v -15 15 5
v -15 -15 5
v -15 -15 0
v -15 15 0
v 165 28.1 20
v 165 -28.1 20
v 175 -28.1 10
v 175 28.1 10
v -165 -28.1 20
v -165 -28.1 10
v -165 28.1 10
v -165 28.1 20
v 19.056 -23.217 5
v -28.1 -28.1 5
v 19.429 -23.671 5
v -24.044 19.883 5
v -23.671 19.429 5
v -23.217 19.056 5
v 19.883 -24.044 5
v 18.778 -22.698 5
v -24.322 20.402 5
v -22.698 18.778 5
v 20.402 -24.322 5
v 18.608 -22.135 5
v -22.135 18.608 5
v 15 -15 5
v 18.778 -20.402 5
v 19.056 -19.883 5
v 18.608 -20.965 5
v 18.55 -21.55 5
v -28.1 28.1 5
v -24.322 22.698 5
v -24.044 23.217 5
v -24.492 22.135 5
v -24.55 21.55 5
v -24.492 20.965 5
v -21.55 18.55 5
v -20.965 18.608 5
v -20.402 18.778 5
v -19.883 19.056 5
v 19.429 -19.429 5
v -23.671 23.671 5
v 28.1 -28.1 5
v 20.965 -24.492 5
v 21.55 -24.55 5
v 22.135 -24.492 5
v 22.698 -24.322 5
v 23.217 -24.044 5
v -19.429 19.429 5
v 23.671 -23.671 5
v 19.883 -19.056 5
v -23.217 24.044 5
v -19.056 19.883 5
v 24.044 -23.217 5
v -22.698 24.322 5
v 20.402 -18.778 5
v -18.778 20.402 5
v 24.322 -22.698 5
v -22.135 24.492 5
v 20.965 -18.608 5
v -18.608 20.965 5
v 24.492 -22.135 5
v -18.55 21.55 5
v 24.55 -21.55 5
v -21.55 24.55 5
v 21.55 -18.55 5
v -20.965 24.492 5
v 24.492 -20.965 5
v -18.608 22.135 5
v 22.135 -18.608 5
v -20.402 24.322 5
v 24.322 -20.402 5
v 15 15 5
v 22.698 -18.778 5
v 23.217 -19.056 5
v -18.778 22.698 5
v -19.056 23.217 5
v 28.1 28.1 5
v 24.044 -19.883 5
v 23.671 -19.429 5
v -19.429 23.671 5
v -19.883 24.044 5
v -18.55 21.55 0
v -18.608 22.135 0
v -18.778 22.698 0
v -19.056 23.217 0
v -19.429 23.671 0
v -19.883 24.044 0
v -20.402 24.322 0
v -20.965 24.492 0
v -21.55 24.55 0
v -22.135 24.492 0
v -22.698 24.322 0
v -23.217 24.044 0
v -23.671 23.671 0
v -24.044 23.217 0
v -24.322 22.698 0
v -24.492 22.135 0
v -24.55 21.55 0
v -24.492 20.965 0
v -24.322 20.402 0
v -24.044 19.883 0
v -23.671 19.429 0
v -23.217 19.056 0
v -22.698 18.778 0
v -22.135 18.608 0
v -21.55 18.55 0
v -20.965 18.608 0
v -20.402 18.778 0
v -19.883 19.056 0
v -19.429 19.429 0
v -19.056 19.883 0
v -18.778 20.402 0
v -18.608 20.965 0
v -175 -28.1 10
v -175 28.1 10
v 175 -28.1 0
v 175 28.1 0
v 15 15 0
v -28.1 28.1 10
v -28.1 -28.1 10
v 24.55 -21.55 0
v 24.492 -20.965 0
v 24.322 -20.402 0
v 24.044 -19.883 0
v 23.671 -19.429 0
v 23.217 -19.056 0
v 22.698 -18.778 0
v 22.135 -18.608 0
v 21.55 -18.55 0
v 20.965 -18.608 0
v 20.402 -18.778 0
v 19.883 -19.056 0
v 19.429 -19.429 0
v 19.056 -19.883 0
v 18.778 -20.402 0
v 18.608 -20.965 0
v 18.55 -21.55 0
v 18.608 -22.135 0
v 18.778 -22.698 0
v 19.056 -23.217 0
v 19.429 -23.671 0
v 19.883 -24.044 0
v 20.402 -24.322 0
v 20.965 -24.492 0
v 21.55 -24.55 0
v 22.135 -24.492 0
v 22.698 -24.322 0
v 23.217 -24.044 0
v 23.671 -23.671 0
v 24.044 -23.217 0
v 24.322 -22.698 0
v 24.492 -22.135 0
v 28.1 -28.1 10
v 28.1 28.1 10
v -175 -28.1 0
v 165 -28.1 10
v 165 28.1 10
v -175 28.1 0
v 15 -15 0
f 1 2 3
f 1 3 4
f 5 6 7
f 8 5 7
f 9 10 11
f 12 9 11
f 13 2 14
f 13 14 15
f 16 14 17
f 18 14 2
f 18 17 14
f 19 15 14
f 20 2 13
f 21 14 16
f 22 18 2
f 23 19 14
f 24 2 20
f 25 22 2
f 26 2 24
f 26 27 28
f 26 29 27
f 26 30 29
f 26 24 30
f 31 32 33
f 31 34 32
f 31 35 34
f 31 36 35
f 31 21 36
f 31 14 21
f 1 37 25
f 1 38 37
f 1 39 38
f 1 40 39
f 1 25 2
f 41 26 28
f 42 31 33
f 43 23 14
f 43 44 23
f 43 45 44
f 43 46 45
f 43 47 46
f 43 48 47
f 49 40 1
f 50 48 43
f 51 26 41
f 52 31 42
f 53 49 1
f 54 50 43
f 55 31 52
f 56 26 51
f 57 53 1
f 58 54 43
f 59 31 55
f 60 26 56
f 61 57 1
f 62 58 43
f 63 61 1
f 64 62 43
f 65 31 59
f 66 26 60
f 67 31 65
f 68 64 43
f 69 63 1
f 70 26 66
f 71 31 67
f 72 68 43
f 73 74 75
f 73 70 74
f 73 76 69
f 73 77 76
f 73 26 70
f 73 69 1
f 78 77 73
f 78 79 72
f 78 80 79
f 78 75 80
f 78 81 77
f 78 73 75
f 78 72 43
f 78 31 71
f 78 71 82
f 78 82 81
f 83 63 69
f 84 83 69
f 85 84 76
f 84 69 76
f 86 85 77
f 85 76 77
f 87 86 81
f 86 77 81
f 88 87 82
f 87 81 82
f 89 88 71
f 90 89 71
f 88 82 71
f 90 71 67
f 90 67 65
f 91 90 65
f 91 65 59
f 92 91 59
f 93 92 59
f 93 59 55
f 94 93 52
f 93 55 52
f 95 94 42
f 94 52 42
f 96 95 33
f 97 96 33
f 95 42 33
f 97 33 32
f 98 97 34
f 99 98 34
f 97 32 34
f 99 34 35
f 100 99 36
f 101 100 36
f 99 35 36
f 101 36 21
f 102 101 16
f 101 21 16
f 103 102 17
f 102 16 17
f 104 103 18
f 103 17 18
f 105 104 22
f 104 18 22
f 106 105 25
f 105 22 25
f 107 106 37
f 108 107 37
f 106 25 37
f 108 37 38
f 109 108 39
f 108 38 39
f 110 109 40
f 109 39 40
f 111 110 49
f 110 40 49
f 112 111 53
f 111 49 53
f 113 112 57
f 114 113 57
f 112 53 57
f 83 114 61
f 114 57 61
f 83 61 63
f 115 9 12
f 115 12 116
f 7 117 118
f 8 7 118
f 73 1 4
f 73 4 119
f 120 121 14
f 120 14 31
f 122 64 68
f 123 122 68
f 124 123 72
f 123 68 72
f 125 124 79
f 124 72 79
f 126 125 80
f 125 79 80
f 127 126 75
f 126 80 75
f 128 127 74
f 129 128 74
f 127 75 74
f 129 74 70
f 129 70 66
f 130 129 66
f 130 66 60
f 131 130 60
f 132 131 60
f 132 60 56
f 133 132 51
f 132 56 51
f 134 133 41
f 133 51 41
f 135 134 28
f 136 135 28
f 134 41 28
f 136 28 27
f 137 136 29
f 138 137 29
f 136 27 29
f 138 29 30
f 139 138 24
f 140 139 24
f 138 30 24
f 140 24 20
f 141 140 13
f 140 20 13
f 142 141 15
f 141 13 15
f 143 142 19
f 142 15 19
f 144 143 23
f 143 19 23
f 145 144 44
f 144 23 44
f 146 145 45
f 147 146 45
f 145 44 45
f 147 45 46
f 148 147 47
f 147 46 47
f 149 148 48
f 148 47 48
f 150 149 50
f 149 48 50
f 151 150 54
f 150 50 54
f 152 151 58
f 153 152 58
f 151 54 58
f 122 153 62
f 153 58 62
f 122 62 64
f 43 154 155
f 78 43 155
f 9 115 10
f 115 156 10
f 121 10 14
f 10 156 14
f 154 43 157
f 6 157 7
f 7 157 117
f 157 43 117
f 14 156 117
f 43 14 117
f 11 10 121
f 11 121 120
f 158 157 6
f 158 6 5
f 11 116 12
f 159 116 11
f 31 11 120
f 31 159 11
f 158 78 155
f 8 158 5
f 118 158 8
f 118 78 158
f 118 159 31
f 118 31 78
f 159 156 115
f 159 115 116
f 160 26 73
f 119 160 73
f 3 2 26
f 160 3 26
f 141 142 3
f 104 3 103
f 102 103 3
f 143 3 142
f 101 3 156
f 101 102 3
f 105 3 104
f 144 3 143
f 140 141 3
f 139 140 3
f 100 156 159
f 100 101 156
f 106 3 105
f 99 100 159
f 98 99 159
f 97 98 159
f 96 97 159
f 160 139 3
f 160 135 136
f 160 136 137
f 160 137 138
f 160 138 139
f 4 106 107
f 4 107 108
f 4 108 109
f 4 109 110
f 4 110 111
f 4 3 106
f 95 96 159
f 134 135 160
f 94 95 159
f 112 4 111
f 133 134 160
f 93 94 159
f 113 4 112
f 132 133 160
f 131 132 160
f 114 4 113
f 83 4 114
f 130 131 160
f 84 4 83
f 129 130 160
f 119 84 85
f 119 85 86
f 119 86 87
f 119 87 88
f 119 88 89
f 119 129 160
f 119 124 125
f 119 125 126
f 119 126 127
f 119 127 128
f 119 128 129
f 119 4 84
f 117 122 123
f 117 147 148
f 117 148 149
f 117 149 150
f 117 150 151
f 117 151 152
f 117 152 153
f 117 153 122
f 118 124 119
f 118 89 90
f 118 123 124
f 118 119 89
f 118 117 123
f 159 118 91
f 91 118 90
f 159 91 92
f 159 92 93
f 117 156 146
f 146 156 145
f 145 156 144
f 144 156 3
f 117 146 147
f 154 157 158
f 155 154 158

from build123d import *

# Parameters (mm, degrees)
SKETCH1_W           = 330
SKETCH1_H           = 56.2
BOSS_EXTRUDE1_DEPTH = 10
SKETCH2_W           = 56.2
SKETCH2_H           = 56.2
CUT_EXTRUDE1_DEPTH  = 5
SKETCH3_W           = 10
SKETCH3_H           = 56.2
BOSS_EXTRUDE2_DEPTH = 10
SKETCH4_W           = 10
SKETCH4_H           = 56.2
BOSS_EXTRUDE3_DEPTH = 10
CUT_EXTRUDE2_DEPTH  = 56.2
SKETCH6_W           = 10
SKETCH6_H           = 56.2
BOSS_EXTRUDE4_DEPTH = 10
SKETCH7_W           = 10
SKETCH7_H           = 56.2
BOSS_EXTRUDE5_DEPTH = 10
CUT_EXTRUDE3_DEPTH  = 56.2
SKETCH9_W           = 30
SKETCH9_H           = 30
CUT_EXTRUDE4_DEPTH  = 5
SKETCH10_R          = 3
CUT_EXTRUDE5_DEPTH  = 5


with BuildPart() as part:
    # Sketch1 → Boss-Extrude1 (new body)
    with BuildSketch(Plane.XY):
        Rectangle(SKETCH1_W, SKETCH1_H)
    extrude(amount=BOSS_EXTRUDE1_DEPTH)

    # Sketch2 → Cut-Extrude1 (cut)
    with BuildSketch(Plane.XY.offset(10)):
        Rectangle(SKETCH2_W, SKETCH2_H)
    extrude(amount=-CUT_EXTRUDE1_DEPTH, mode=Mode.SUBTRACT)

    # Sketch3 → Boss-Extrude2 (add)
    with BuildSketch(Plane(origin=(165, 0, 0), x_dir=(0, 0, -1), z_dir=(1, 0, 0))):
        with Locations((-5, 0)):
            Rectangle(SKETCH3_W, SKETCH3_H)
    extrude(amount=BOSS_EXTRUDE2_DEPTH)

    # Sketch4 → Boss-Extrude3 (add)
    with BuildSketch(Plane.XY.offset(10)):
        with Locations((170, 0)):
            Rectangle(SKETCH4_W, SKETCH4_H)
    extrude(amount=BOSS_EXTRUDE3_DEPTH)

    # Sketch5 → Cut-Extrude2 (cut)
    with BuildSketch(Plane(origin=(0, 28.1, 0), x_dir=(1, 0, 0), z_dir=(0, 1, 0))):
        Polygon((165, -20), (175, -10), (175, -20), align=None)
    extrude(amount=-CUT_EXTRUDE2_DEPTH, mode=Mode.SUBTRACT)

    # Sketch6 → Boss-Extrude4 (add)
    with BuildSketch(Plane.ZY.offset(165)):
        with Locations((5, 0)):
            Rectangle(SKETCH6_W, SKETCH6_H)
    extrude(amount=BOSS_EXTRUDE4_DEPTH)

    # Sketch7 → Boss-Extrude5 (add)
    with BuildSketch(Plane.XY.offset(10)):
        with Locations((-170, 0)):
            Rectangle(SKETCH7_W, SKETCH7_H)
    extrude(amount=BOSS_EXTRUDE5_DEPTH)

    # Sketch8 → Cut-Extrude3 (cut)
    with BuildSketch(Plane(origin=(0, 28.1, 0), x_dir=(1, 0, 0), z_dir=(0, 1, 0))):
        Polygon((-165, -20), (-175, -10), (-175, -20), align=None)
    extrude(amount=-CUT_EXTRUDE3_DEPTH, mode=Mode.SUBTRACT)

    # Sketch9 → Cut-Extrude4 (cut)
    with BuildSketch(Plane.XY.offset(5)):
        Rectangle(SKETCH9_W, SKETCH9_H)
    extrude(amount=-CUT_EXTRUDE4_DEPTH, mode=Mode.SUBTRACT)

    # Sketch10 → Cut-Extrude5 (cut)
    with BuildSketch(Plane.XY.offset(5)):
        with Locations((-21.55, 21.55)):
            Circle(SKETCH10_R)
        with Locations((21.55, -21.55)):
            Circle(SKETCH10_R)
    extrude(amount=-CUT_EXTRUDE5_DEPTH, mode=Mode.SUBTRACT)


solid = part.part
